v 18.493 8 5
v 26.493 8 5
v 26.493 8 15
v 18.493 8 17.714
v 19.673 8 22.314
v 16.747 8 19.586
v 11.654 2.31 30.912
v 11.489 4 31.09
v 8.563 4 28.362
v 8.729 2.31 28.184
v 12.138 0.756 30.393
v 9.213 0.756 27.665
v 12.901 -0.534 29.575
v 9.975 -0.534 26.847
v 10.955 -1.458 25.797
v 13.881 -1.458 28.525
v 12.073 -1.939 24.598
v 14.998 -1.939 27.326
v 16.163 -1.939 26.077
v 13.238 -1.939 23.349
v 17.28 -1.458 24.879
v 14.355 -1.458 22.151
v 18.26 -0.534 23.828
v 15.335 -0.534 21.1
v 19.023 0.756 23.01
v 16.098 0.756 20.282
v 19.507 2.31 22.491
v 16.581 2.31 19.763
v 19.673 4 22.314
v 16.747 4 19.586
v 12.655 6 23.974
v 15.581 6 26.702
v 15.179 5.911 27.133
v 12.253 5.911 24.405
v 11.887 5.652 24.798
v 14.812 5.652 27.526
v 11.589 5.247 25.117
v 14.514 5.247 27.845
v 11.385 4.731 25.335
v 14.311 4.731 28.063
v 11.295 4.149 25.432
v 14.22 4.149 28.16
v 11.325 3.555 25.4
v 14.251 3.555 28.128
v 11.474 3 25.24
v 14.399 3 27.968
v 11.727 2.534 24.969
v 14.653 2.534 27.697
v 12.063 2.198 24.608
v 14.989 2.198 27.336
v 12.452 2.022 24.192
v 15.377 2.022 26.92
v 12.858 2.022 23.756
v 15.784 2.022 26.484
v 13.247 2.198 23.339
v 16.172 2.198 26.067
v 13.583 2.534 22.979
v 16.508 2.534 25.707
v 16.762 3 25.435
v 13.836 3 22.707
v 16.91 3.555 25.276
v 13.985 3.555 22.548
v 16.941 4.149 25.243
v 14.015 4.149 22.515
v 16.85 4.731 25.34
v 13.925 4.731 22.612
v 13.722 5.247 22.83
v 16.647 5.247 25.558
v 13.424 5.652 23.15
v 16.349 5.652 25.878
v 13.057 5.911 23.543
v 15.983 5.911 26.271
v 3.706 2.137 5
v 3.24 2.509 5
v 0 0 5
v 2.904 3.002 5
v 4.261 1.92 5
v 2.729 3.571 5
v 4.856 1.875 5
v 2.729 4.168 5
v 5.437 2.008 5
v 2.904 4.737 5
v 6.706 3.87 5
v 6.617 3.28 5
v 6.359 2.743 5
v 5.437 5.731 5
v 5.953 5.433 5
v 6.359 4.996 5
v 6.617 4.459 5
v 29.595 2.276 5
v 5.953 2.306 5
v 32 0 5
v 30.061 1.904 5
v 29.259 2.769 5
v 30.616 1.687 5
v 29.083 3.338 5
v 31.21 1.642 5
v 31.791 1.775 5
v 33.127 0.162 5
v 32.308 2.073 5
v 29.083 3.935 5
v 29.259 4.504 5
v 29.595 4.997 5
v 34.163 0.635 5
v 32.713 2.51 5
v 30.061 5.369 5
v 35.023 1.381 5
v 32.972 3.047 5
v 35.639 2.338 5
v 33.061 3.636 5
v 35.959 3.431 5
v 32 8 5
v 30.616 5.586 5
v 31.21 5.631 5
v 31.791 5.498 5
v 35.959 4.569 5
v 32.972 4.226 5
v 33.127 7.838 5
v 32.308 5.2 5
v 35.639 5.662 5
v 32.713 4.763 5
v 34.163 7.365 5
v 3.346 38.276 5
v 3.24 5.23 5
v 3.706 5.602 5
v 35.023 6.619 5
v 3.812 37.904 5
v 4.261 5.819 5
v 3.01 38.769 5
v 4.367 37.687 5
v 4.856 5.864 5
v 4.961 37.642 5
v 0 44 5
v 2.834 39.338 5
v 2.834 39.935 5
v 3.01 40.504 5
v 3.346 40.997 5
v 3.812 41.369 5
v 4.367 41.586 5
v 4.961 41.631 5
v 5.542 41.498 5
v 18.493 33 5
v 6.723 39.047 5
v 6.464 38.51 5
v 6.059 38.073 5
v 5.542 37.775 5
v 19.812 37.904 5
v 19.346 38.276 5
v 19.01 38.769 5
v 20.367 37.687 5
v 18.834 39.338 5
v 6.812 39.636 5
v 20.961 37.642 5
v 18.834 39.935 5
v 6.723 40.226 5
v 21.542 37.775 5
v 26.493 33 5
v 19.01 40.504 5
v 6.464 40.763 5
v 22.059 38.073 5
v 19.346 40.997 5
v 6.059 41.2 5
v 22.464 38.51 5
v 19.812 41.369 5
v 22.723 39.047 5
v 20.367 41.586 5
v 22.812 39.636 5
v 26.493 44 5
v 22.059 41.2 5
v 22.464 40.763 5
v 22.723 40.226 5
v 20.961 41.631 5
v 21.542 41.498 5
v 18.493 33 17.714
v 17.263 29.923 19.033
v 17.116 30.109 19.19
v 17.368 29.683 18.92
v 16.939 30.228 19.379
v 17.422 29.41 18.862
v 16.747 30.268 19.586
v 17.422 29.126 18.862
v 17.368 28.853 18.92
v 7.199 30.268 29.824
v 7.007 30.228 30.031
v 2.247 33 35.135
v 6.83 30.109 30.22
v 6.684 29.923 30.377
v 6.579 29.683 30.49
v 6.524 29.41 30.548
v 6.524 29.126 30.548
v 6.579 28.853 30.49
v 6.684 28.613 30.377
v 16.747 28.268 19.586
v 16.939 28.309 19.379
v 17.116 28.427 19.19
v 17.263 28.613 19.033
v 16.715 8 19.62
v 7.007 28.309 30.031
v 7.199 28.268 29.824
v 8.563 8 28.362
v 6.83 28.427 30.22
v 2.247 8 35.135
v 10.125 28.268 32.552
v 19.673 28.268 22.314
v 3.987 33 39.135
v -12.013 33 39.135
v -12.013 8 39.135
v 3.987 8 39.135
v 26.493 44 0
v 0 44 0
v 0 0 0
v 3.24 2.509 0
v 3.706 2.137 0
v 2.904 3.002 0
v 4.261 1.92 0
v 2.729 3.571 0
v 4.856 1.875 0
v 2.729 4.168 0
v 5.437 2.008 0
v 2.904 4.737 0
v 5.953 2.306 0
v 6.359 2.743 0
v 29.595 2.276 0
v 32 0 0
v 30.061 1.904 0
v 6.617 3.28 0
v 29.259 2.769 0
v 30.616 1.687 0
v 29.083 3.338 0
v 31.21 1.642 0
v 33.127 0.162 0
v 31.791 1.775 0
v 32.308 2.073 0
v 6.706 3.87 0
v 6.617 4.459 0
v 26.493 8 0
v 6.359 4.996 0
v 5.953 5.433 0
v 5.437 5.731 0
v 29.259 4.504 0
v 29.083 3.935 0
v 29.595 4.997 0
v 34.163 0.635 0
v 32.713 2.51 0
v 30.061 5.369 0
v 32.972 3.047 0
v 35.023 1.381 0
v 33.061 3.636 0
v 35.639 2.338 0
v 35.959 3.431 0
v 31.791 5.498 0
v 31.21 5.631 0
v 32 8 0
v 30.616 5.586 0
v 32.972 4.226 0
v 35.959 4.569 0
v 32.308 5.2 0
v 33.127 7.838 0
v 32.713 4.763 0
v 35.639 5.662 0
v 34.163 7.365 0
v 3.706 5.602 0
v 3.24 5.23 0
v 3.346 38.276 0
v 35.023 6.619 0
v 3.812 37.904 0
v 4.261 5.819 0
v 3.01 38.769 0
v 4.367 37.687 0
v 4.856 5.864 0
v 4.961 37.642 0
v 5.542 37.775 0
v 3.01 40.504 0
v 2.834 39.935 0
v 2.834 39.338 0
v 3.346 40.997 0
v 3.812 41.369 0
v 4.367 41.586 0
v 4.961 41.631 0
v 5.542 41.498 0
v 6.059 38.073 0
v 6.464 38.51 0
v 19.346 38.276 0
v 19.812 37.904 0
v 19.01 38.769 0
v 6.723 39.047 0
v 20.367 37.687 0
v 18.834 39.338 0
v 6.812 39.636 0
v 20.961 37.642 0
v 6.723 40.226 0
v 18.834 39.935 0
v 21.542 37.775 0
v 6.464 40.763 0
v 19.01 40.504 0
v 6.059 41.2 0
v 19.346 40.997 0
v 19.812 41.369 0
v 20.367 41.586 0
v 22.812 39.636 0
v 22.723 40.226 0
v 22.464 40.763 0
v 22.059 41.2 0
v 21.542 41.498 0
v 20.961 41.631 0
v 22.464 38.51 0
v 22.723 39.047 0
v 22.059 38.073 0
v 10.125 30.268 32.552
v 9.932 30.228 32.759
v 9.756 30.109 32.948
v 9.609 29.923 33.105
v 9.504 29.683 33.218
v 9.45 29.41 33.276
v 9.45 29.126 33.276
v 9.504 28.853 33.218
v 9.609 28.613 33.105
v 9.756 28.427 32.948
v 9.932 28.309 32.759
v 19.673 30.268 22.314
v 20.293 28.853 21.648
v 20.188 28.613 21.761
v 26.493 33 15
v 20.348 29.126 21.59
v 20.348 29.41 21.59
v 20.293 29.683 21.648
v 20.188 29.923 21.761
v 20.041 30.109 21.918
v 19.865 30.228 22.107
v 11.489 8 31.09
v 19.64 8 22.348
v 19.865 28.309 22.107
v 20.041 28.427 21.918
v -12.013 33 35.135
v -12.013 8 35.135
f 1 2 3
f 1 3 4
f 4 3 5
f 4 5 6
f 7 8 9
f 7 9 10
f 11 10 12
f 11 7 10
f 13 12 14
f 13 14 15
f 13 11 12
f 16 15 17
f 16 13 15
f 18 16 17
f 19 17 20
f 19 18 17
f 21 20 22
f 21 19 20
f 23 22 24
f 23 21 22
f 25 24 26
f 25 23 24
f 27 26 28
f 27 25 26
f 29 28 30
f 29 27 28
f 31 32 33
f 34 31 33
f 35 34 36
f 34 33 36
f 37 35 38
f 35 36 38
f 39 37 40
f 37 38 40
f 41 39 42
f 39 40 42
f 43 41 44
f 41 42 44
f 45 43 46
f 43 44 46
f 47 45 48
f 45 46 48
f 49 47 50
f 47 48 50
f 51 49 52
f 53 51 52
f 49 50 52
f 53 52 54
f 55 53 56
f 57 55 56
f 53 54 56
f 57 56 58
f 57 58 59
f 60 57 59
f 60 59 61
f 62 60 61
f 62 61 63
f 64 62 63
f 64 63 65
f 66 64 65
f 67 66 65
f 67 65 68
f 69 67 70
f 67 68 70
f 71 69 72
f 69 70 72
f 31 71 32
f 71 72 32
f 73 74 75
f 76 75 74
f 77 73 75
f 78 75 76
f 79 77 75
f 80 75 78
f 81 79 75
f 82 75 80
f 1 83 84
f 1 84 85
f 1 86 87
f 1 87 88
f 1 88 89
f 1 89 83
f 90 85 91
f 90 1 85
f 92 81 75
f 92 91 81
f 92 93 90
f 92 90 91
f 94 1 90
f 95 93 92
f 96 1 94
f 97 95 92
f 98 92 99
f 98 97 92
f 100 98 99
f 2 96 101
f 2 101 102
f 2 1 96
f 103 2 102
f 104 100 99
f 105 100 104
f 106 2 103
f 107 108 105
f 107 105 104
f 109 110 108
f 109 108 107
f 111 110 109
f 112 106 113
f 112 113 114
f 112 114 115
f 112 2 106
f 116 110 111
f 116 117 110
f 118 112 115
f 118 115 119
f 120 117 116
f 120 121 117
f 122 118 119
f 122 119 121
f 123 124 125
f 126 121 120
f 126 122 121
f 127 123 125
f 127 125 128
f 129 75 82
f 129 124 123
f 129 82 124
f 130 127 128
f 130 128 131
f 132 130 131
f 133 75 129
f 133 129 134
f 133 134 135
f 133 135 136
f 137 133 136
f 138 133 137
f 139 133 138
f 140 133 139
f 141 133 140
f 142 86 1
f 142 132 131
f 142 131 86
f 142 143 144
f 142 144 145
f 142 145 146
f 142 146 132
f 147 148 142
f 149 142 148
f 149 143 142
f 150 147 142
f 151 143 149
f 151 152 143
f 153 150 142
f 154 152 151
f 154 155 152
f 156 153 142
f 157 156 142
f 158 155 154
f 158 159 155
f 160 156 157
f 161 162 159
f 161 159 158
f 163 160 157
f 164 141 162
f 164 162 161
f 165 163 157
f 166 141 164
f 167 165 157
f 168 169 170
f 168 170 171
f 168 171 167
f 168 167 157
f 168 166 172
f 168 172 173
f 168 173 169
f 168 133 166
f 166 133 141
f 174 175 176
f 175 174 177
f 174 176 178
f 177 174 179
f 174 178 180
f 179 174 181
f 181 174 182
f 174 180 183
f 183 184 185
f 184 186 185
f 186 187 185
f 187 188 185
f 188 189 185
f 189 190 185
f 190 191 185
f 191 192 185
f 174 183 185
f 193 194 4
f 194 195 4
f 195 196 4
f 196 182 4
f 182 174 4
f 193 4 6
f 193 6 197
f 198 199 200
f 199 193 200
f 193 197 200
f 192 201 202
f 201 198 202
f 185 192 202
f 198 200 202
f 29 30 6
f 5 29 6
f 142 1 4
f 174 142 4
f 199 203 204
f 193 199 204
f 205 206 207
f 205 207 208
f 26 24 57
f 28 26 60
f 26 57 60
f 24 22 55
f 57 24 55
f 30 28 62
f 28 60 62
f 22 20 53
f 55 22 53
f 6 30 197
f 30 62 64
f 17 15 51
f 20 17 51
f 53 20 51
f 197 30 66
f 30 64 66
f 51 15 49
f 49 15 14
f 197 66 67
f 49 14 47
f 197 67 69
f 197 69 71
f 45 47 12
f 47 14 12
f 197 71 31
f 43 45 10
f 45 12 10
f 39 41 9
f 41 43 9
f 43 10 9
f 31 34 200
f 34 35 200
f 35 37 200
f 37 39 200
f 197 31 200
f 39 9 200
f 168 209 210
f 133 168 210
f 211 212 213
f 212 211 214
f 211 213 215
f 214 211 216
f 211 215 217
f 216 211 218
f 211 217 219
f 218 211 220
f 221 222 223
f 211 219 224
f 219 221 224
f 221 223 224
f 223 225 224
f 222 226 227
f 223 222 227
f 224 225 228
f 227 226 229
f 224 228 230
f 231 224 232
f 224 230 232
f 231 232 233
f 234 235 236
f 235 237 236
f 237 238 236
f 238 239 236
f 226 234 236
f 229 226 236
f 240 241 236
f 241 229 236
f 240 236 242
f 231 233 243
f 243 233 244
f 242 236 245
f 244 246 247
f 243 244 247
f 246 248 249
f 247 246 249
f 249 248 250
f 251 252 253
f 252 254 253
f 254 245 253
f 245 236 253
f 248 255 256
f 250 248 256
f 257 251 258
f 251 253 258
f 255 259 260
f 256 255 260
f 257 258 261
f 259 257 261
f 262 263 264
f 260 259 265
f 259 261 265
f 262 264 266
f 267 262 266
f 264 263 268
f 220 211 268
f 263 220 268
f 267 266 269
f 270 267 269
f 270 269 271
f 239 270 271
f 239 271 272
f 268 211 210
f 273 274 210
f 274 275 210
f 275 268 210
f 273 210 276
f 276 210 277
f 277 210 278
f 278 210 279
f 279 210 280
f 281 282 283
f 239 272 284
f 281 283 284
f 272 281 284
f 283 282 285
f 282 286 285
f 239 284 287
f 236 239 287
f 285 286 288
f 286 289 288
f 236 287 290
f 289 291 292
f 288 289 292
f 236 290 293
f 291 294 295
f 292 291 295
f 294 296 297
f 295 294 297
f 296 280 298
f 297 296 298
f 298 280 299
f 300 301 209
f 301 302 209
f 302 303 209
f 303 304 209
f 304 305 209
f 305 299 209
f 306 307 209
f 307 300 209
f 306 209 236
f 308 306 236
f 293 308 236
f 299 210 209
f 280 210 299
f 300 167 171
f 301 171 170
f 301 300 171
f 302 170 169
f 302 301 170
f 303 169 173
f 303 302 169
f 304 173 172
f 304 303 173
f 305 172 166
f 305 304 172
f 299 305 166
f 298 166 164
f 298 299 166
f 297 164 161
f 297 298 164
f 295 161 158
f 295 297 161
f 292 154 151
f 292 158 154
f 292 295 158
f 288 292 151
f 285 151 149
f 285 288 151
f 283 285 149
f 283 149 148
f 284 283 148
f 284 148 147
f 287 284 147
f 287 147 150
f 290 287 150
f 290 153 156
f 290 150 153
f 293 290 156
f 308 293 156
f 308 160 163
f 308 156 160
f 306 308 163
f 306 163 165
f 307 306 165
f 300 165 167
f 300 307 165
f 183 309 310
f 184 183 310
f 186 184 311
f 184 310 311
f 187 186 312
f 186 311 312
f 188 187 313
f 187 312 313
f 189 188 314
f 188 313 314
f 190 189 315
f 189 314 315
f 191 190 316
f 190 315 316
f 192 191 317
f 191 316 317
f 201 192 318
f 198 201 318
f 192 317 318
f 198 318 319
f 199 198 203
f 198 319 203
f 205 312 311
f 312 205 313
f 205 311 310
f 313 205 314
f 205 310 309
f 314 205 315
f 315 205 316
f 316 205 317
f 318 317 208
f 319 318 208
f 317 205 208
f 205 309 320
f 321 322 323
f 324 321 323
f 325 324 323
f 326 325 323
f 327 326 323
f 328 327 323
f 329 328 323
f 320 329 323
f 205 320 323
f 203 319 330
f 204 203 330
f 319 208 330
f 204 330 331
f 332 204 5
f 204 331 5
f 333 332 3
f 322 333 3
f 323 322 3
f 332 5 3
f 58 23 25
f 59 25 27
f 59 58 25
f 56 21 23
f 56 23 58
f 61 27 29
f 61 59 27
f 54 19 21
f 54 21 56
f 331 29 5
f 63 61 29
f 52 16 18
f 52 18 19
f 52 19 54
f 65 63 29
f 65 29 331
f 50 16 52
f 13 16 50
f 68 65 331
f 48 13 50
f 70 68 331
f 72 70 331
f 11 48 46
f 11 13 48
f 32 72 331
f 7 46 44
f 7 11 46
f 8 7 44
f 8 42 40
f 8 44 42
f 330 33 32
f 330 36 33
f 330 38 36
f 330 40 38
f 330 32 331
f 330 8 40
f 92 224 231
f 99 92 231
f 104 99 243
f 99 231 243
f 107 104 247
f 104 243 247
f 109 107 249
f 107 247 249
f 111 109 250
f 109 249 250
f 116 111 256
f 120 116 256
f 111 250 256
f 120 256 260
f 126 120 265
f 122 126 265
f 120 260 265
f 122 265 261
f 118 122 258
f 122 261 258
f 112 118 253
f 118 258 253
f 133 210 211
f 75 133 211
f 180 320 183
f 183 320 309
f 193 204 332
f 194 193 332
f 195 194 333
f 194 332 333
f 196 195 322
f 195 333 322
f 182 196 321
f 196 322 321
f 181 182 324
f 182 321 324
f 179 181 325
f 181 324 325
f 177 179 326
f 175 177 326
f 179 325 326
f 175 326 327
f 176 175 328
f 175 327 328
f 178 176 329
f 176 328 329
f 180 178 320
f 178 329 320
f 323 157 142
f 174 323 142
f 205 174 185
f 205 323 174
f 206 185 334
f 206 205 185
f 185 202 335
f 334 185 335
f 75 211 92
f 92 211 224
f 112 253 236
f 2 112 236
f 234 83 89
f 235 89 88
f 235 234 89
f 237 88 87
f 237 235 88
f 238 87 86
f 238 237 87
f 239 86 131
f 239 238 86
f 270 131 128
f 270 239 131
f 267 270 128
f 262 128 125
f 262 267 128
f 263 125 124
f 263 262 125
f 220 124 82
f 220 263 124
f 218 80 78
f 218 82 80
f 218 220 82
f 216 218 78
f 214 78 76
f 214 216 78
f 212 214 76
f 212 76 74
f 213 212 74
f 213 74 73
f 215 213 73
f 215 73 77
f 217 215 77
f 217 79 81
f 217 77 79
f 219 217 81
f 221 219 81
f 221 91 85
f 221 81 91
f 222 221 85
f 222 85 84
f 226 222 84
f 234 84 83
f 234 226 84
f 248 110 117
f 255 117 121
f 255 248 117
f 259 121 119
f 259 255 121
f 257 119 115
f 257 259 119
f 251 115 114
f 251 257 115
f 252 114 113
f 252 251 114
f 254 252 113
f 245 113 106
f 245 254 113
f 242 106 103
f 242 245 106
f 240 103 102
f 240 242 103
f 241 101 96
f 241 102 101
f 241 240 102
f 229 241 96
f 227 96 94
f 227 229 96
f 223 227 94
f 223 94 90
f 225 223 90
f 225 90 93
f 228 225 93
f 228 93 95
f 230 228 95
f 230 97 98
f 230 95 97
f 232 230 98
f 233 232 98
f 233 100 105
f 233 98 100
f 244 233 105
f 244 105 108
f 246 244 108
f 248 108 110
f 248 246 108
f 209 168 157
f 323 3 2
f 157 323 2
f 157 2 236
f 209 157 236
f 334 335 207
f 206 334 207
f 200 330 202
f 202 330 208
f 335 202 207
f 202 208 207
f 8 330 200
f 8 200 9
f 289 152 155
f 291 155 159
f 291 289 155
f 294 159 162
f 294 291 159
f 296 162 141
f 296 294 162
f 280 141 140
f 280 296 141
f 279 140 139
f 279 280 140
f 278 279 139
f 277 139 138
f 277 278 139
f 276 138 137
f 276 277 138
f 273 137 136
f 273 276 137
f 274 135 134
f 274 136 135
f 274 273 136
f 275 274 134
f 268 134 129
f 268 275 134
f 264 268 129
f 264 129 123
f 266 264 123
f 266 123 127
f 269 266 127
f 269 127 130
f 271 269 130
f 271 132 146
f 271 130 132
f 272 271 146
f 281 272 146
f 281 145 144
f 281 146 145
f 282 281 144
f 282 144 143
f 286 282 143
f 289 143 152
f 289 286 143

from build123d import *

# Parameters (mm, degrees)
F1_DEPTH  = 5
F3_DEPTH  = 25
F5_R      = 2
F5_W      = 5.9894541353
F5_H      = 11.9529513837
F6_DEPTH  = 4
F8_DEPTH  = 10
F9_R      = 2
F10_DEPTH = 25


with BuildPart() as f1:
    # F0 (on Top) → F1 (new body)
    with BuildSketch(Plane.XY):
        with BuildLine():
            Line((0, 44), (0, 0))
            Line((0, 0), (26.4925560224, 0))
            Line((26.4925560224, 0), (32, 0))
            ThreePointArc((32, 0), (36, 4), (32, 8))
            Line((32, 8), (26.4925560224, 8))
            Line((26.4925560224, 8), (26.4925560224, 44))
            Line((26.4925560224, 44), (0, 44))
        make_face()
    extrude(amount=F1_DEPTH)

    # F2 (on face) → F3 (join)
    with BuildSketch(Plane(origin=(0, 8, 0), x_dir=(-1, 0, 0), z_dir=(0, 1, 0))):
        Polygon((-26.4925560224, 15), (-26.4925560224, 5), (-18.4925560224, 5), (-18.4925560224, 17.7138329376), (-2.2473606405, 35.1346721534), (12.0133898596, 35.1346721534), (12.0133898596, 39.1346721534), (-3.9866101404, 39.1346721534), align=None)
    extrude(amount=F3_DEPTH)

    # F5 (on offset) → F6 (join)
    with BuildSketch(Plane(origin=(21.6520220325, 0, 20.1908371907), x_dir=(0, 1, 0), z_dir=(0.7313537016, 0, 0.6819983601))):
        with BuildLine():
            Line((8, 14.9024257631), (4, 14.9024257631))
            ThreePointArc((4, 14.9024257631), (-2, 8.9024257631), (4, 2.9024257631))
            Line((4, 2.9024257631), (8, 2.9024257631))
            Line((8, 2.9024257631), (8, 2.9494743794))
            Line((8, 2.9494743794), (8, 14.9024257631))
        make_face()
        with Locations((4, 8.9024257631)):
            Circle(F5_R, mode=Mode.SUBTRACT)
        with Locations((10.9947270676, 8.9259500713)):
            Rectangle(F5_W, F5_H)
    extrude(amount=-F6_DEPTH)

    # F7 (on offset) → F8 (cut)
    with BuildSketch(Plane(origin=(21.6520220325, 0, 20.1908371907), x_dir=(0, 1, 0), z_dir=(0.7313537016, 0, 0.6819983601))):
        with BuildLine():
            ThreePointArc((30.2680338025, 16.9024257631), (29.2680338025, 17.9024257631), (28.2680338025, 16.9024257631))
            Line((28.2680338025, 16.9024257631), (28.2680338025, 2.9024257631))
            ThreePointArc((28.2680338025, 2.9024257631), (29.2680338025, 1.9024257631), (30.2680338025, 2.9024257631))
            Line((30.2680338025, 2.9024257631), (30.2680338025, 16.9024257631))
        make_face()
    extrude(amount=-F8_DEPTH, mode=Mode.SUBTRACT)

    # F9 (on Top) → F10 (cut)
    with BuildSketch(Plane.XY):
        with Locations((4.8117552102, 39.6364554763)):
            Circle(F9_R)
        with Locations((20.8117552102, 39.6364554763)):
            Circle(F9_R)
        with Locations((31.0607589781, 3.6364554763)):
            Circle(F9_R)
        with Locations((4.7061769292, 3.8695221301)):
            Circle(F9_R)
    extrude(amount=F10_DEPTH, mode=Mode.SUBTRACT)


solid = f1.part
